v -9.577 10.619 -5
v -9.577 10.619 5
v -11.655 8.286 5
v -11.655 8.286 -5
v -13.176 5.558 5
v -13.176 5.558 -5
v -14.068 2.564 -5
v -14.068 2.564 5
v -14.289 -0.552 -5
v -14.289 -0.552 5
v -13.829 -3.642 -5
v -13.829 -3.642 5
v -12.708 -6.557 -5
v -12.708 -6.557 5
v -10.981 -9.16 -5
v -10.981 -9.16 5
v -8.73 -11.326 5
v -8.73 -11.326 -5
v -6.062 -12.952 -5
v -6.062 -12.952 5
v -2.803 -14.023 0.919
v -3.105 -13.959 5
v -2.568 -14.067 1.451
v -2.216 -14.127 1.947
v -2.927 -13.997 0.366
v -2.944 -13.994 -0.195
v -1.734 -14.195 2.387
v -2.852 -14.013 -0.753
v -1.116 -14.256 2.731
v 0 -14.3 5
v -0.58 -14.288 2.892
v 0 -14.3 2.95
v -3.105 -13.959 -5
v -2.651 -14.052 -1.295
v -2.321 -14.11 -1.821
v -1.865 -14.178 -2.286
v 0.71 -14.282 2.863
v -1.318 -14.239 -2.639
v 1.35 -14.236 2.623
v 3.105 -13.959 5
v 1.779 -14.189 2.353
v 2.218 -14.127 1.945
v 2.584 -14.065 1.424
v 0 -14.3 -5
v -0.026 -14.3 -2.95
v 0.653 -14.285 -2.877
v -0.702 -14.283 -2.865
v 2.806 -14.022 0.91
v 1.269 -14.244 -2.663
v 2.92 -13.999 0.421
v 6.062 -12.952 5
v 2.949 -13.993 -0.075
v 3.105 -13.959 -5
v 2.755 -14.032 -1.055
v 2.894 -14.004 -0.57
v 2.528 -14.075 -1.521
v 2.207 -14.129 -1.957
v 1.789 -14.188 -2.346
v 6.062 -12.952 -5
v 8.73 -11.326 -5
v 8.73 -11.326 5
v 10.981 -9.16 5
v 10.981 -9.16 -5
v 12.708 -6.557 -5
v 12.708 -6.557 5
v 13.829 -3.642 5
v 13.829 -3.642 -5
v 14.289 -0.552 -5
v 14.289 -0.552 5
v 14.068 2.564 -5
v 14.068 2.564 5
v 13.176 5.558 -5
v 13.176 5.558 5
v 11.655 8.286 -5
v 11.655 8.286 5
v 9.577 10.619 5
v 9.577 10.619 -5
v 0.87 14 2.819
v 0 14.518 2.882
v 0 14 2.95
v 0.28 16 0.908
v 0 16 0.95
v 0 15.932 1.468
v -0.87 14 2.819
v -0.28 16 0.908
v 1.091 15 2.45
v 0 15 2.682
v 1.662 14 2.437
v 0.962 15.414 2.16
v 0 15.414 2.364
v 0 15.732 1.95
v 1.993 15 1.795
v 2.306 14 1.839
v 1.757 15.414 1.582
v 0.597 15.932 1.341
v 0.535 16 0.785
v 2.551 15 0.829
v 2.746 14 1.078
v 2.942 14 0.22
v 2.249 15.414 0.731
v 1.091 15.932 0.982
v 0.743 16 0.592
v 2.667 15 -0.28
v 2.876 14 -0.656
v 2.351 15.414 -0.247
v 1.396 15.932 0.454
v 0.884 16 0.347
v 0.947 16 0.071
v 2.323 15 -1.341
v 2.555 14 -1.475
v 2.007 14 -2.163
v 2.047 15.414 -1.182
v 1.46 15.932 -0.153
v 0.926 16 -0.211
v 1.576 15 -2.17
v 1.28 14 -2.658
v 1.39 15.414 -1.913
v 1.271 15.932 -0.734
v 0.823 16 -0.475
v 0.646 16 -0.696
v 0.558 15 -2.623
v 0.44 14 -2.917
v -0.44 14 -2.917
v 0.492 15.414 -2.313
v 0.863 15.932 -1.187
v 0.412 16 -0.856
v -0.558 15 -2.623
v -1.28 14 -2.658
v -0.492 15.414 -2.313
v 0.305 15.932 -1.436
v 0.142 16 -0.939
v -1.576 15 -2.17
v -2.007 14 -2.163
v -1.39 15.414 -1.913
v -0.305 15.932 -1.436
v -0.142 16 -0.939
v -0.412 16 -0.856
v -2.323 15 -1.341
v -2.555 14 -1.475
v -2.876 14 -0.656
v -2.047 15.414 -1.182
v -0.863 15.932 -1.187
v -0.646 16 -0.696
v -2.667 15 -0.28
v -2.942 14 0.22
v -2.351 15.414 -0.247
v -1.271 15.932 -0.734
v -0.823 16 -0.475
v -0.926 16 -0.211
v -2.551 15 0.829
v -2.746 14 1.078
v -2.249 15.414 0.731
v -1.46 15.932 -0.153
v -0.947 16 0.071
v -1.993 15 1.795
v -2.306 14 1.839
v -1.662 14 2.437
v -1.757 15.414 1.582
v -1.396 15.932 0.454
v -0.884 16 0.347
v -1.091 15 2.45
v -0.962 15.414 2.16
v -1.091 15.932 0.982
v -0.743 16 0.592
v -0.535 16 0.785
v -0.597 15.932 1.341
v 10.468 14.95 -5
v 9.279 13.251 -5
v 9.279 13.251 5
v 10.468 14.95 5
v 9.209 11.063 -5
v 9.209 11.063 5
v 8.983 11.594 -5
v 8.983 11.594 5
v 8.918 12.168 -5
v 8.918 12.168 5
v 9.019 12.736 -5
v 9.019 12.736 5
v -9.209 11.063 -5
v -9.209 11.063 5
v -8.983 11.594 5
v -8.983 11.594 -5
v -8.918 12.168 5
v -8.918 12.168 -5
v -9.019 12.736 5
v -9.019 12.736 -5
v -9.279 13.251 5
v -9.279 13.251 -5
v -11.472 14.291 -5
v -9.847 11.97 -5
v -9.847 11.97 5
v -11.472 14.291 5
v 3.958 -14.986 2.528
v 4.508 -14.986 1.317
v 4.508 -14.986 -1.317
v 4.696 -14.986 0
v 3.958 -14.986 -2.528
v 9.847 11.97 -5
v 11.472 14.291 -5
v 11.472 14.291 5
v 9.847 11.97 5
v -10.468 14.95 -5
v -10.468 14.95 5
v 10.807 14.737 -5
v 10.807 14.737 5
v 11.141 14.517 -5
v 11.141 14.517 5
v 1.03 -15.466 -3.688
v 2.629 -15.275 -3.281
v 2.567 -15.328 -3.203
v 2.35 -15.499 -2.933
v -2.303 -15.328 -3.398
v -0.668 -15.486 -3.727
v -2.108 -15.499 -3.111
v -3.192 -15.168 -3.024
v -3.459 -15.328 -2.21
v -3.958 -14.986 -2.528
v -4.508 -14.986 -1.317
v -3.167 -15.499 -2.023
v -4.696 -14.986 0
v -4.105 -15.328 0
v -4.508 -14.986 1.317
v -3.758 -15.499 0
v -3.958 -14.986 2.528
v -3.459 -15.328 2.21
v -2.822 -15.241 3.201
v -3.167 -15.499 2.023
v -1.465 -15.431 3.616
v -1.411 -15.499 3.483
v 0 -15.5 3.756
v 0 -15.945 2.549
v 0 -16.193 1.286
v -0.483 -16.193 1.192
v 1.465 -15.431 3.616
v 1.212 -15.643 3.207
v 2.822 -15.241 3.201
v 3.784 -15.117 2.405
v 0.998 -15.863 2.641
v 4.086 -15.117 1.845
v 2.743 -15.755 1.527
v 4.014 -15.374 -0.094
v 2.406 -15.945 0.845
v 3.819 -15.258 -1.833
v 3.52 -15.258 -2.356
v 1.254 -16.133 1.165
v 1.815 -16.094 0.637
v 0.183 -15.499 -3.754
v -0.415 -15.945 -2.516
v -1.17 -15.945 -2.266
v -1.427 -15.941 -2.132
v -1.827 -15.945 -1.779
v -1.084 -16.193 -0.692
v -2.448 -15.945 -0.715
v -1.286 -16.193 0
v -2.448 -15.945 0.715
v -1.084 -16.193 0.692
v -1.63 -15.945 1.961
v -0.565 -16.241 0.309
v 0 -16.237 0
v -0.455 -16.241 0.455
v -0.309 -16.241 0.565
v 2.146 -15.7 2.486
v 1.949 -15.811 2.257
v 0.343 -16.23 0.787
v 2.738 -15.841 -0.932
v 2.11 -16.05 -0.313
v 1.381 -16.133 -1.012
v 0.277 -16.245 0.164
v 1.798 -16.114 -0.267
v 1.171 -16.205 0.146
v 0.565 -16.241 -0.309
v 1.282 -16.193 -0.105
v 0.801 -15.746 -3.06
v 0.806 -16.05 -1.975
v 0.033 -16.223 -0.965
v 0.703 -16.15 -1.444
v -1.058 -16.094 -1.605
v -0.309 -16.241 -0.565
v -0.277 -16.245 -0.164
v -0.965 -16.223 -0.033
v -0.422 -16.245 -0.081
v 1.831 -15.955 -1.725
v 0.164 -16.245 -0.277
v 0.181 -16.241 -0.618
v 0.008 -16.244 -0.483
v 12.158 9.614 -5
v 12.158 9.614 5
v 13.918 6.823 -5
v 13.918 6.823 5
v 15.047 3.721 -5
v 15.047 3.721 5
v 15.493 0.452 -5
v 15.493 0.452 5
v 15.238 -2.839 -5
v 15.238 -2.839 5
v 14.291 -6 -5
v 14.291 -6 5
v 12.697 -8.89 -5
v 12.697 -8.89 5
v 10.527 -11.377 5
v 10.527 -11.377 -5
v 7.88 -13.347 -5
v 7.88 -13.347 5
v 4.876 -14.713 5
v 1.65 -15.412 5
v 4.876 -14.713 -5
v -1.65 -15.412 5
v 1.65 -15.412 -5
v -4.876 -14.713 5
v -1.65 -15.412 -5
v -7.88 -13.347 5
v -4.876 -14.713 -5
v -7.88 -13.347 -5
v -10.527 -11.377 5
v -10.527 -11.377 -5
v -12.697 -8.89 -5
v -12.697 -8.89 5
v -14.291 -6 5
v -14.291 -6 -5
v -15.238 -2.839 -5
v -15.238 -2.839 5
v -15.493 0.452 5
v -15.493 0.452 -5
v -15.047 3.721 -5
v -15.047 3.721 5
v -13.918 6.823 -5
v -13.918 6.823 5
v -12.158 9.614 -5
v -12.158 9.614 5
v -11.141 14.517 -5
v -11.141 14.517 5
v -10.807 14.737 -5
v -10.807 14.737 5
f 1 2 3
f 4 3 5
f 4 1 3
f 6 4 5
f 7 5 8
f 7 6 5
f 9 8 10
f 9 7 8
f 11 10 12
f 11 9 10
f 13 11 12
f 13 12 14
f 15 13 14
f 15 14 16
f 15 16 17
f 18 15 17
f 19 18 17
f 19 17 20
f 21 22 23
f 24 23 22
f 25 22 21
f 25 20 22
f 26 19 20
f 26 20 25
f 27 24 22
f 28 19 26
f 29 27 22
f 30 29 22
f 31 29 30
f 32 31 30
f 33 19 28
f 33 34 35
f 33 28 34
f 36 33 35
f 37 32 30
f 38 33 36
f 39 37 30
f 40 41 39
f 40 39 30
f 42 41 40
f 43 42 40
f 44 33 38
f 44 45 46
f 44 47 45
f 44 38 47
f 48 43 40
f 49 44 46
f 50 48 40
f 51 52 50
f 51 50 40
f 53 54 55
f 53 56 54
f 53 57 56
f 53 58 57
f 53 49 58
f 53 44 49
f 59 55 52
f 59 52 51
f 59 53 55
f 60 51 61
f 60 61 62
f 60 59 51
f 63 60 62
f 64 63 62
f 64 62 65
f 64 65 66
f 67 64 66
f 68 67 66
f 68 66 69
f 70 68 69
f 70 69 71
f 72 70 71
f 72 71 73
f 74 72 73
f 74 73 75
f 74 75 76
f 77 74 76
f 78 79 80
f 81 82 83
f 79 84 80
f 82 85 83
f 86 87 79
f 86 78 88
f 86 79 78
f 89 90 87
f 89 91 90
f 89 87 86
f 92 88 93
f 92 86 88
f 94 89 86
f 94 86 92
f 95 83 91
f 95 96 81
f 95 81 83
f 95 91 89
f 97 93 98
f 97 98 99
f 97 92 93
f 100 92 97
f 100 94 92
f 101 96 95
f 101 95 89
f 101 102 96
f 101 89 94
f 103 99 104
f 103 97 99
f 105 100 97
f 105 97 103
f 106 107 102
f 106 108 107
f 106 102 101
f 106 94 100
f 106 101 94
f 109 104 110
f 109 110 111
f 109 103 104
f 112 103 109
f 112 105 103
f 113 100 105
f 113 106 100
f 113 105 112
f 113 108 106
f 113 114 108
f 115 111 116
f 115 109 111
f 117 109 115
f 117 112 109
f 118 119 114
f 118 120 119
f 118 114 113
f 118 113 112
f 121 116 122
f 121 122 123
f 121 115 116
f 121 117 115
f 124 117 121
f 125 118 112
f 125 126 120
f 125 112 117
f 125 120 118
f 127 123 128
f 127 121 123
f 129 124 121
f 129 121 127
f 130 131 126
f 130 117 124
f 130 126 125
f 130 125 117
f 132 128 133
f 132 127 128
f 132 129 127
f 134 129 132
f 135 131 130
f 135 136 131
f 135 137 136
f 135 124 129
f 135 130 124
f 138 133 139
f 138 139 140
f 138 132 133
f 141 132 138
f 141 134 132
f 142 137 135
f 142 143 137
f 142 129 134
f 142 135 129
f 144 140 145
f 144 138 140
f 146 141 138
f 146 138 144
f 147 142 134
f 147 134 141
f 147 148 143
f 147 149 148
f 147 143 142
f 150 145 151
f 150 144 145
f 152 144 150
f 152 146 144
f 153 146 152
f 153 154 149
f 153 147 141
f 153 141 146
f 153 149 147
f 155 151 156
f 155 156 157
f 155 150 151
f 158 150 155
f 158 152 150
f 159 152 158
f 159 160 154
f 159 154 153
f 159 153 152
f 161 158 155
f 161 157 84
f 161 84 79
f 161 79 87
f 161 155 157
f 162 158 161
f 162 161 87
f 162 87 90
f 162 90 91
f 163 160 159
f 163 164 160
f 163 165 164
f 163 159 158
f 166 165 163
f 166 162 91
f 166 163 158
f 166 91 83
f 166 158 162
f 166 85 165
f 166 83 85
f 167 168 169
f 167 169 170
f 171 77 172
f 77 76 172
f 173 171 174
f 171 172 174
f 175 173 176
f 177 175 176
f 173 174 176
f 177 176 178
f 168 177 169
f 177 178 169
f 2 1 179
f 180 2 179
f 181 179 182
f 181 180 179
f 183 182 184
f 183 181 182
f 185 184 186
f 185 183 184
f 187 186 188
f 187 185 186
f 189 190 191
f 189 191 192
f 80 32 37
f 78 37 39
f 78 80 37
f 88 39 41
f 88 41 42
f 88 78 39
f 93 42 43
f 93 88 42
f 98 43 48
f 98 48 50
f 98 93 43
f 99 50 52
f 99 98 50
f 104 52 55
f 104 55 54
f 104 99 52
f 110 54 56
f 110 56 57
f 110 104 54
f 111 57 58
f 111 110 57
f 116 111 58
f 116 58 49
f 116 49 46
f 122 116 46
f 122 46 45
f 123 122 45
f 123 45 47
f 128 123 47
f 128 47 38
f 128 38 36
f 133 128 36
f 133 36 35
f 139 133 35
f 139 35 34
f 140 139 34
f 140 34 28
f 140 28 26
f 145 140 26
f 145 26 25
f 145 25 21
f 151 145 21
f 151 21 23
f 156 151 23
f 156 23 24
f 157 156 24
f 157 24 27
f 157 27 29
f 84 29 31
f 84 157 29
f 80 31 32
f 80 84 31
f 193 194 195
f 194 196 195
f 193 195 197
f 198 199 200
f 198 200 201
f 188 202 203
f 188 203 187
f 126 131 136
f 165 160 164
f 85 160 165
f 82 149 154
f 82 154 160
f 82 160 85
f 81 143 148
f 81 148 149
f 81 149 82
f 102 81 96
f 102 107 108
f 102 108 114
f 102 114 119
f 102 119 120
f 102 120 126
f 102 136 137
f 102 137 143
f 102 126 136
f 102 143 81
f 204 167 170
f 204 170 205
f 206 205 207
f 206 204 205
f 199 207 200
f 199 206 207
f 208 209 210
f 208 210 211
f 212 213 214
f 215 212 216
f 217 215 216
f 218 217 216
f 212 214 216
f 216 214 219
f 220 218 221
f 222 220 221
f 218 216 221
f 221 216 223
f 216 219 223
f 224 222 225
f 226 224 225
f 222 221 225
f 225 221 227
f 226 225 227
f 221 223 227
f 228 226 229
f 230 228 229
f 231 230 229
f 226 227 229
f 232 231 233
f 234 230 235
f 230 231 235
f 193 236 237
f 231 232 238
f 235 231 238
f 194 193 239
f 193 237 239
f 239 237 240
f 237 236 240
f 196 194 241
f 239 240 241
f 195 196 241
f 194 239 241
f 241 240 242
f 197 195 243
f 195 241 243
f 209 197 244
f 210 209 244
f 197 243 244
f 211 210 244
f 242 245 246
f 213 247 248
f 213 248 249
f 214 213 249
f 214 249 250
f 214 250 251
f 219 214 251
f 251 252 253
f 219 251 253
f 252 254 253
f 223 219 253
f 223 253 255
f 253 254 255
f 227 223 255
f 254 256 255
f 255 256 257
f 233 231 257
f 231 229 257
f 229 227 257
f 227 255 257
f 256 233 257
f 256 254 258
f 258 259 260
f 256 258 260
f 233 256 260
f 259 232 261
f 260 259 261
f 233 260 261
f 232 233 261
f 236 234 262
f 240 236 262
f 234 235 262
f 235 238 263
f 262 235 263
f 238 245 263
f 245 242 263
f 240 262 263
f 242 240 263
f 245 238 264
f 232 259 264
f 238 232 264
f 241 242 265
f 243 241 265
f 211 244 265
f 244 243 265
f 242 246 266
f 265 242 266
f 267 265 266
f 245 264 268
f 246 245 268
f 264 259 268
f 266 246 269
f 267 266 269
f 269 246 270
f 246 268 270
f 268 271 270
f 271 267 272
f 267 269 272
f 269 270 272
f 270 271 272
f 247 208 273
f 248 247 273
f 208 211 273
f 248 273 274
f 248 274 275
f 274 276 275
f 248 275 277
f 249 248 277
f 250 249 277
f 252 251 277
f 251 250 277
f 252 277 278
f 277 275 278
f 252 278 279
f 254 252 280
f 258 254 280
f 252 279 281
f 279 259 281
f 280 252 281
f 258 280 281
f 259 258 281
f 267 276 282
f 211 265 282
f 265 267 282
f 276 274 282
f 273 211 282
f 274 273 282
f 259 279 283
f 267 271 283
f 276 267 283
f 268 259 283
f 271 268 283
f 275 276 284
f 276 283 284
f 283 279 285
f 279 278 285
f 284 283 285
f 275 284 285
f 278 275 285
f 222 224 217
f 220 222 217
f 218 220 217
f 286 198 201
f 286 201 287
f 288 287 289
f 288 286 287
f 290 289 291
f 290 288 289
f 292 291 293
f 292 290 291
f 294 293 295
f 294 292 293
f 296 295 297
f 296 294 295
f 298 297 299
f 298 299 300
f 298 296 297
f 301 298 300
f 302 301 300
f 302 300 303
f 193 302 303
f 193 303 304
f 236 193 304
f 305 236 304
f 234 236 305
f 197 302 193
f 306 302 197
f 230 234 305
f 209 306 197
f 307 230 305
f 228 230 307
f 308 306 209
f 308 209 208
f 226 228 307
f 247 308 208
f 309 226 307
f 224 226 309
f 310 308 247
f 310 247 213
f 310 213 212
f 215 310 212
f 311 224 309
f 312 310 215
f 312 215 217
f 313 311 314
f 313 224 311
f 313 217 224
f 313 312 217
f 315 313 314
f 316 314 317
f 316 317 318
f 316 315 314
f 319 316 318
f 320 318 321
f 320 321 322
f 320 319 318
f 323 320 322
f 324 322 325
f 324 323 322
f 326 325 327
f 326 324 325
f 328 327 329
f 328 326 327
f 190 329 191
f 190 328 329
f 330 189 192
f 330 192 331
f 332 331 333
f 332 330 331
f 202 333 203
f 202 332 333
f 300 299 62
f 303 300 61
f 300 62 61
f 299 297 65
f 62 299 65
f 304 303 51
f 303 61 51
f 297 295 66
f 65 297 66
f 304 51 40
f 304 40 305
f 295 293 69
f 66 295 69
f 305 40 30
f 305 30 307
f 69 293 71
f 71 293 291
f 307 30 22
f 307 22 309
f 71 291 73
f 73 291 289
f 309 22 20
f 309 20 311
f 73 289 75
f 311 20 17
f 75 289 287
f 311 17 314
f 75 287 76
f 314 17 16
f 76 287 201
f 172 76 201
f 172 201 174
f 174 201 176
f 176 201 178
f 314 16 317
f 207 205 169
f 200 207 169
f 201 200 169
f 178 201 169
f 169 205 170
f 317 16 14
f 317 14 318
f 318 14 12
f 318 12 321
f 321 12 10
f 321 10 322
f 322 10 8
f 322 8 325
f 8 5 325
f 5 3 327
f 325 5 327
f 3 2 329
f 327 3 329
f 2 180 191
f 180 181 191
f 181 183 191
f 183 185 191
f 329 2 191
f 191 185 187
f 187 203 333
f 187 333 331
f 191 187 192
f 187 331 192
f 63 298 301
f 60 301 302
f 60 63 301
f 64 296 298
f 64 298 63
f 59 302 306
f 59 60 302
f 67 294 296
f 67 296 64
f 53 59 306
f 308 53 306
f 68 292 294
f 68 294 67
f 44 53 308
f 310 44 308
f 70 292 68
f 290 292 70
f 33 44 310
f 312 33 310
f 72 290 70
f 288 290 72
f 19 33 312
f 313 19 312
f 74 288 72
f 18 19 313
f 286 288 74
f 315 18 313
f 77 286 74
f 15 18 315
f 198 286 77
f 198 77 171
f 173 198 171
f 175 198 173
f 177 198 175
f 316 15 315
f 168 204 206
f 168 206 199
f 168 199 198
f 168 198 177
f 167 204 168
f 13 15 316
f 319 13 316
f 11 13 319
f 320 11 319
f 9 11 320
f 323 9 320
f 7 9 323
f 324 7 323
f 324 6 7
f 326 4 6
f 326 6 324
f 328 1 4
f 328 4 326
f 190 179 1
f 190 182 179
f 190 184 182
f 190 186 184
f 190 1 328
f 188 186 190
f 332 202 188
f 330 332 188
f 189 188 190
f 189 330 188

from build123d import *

# Parameters (mm, degrees)
BOSS_EXTRUDE1_DEPTH             = 5
BOSS_EXTRUDE1_DEPTH_BACK        = 5
SKETCH2_R                       = 2.95
BOSS_EXTRUDE2_DEPTH             = 16
BOSS_EXTRUDE2_DIRECTION_2_REACH = 24.483
FILLET2_R                       = 2
FILLET3_R                       = 2


with BuildPart() as part:
    # Sketch1 → Boss-Extrude1 (new, two sides: drawn at the far end of the back side and taken through both)
    with BuildSketch(Plane.XY.offset(-BOSS_EXTRUDE1_DEPTH_BACK)):
        with BuildLine():
            Line((8.20214304, 11.713874233), (10.467878905, 14.949680393))
            ThreePointArc((10.467878905, 14.949680393), (10.974647974, 14.627825025), (11.471528727, 14.290904731))
            Line((11.471528727, 14.290904731), (9.846733622, 11.970456841))
            ThreePointArc((9.846733622, 11.970456841), (0, -15.5), (-9.846733622, 11.970456841))
            Line((-9.846733622, 11.970456841), (-11.471528727, 14.290904731))
            ThreePointArc((-11.471528727, 14.290904731), (-10.974647974, 14.627825025), (-10.467878905, 14.949680393))
            Line((-10.467878905, 14.949680393), (-8.20214304, 11.713874233))
            ThreePointArc((-8.20214304, 11.713874233), (0, -14.3), (8.20214304, 11.713874233))
        make_face()
    extrude(amount=BOSS_EXTRUDE1_DEPTH + BOSS_EXTRUDE1_DEPTH_BACK)

    # Sketch2 → Boss-Extrude2 (add)
    with BuildSketch(Plane(origin=(0, 0, 0), x_dir=(1, 0, 0), z_dir=(0, 1, 0))):
        Circle(SKETCH2_R)
    extrude(amount=BOSS_EXTRUDE2_DEPTH)

    # Sketch2 → Boss-Extrude2 direction 2 (add, up to next)
    with BuildSketch(Plane(origin=(0, 0, 0), x_dir=(1, 0, 0), z_dir=(0, 1, 0)), mode=Mode.PRIVATE) as boss_extrude2_direction_2_sk1:
        Circle(SKETCH2_R)
    boss_extrude2_direction_2_tool1 = extrude(boss_extrude2_direction_2_sk1.sketch, amount=-BOSS_EXTRUDE2_DIRECTION_2_REACH, mode=Mode.PRIVATE) - part.part
    add(boss_extrude2_direction_2_tool1.solids().sort_by_distance((0, 0, 0))[0])

    # Fillet2
    fillet2_edges = [part.edges().sort_by_distance(p)[0] for p in [
        (-2.95, 16, 0),
    ]]
    fillet(fillet2_edges, radius=FILLET2_R)

    # Fillet3
    fillet3_edges = [part.edges().sort_by_distance(p)[0] for p in [
        (8.20214304, 11.713874233, 0),
        (-8.20214304, 11.713874233, 0),
    ]]
    fillet(fillet3_edges, radius=FILLET3_R)

    # Sketch4 → Revolve1 (revolve)
    with BuildSketch(Plane(origin=(0, 0, 0), x_dir=(0, 0, -1), z_dir=(1, 0, 0))):
        with BuildLine():
            Line((0, -14.986224552), (-4.696335741, -14.986224552))
            ThreePointArc((-4.696335741, -14.986224552), (-2.444681768, -15.973915756), (0, -16.236614408))
            Line((0, -16.236614408), (0, -14.986224552))
        make_face()
    revolve(axis=Axis((0, -14.986224552, 0), (0, 1, 0)))


solid = part.part
